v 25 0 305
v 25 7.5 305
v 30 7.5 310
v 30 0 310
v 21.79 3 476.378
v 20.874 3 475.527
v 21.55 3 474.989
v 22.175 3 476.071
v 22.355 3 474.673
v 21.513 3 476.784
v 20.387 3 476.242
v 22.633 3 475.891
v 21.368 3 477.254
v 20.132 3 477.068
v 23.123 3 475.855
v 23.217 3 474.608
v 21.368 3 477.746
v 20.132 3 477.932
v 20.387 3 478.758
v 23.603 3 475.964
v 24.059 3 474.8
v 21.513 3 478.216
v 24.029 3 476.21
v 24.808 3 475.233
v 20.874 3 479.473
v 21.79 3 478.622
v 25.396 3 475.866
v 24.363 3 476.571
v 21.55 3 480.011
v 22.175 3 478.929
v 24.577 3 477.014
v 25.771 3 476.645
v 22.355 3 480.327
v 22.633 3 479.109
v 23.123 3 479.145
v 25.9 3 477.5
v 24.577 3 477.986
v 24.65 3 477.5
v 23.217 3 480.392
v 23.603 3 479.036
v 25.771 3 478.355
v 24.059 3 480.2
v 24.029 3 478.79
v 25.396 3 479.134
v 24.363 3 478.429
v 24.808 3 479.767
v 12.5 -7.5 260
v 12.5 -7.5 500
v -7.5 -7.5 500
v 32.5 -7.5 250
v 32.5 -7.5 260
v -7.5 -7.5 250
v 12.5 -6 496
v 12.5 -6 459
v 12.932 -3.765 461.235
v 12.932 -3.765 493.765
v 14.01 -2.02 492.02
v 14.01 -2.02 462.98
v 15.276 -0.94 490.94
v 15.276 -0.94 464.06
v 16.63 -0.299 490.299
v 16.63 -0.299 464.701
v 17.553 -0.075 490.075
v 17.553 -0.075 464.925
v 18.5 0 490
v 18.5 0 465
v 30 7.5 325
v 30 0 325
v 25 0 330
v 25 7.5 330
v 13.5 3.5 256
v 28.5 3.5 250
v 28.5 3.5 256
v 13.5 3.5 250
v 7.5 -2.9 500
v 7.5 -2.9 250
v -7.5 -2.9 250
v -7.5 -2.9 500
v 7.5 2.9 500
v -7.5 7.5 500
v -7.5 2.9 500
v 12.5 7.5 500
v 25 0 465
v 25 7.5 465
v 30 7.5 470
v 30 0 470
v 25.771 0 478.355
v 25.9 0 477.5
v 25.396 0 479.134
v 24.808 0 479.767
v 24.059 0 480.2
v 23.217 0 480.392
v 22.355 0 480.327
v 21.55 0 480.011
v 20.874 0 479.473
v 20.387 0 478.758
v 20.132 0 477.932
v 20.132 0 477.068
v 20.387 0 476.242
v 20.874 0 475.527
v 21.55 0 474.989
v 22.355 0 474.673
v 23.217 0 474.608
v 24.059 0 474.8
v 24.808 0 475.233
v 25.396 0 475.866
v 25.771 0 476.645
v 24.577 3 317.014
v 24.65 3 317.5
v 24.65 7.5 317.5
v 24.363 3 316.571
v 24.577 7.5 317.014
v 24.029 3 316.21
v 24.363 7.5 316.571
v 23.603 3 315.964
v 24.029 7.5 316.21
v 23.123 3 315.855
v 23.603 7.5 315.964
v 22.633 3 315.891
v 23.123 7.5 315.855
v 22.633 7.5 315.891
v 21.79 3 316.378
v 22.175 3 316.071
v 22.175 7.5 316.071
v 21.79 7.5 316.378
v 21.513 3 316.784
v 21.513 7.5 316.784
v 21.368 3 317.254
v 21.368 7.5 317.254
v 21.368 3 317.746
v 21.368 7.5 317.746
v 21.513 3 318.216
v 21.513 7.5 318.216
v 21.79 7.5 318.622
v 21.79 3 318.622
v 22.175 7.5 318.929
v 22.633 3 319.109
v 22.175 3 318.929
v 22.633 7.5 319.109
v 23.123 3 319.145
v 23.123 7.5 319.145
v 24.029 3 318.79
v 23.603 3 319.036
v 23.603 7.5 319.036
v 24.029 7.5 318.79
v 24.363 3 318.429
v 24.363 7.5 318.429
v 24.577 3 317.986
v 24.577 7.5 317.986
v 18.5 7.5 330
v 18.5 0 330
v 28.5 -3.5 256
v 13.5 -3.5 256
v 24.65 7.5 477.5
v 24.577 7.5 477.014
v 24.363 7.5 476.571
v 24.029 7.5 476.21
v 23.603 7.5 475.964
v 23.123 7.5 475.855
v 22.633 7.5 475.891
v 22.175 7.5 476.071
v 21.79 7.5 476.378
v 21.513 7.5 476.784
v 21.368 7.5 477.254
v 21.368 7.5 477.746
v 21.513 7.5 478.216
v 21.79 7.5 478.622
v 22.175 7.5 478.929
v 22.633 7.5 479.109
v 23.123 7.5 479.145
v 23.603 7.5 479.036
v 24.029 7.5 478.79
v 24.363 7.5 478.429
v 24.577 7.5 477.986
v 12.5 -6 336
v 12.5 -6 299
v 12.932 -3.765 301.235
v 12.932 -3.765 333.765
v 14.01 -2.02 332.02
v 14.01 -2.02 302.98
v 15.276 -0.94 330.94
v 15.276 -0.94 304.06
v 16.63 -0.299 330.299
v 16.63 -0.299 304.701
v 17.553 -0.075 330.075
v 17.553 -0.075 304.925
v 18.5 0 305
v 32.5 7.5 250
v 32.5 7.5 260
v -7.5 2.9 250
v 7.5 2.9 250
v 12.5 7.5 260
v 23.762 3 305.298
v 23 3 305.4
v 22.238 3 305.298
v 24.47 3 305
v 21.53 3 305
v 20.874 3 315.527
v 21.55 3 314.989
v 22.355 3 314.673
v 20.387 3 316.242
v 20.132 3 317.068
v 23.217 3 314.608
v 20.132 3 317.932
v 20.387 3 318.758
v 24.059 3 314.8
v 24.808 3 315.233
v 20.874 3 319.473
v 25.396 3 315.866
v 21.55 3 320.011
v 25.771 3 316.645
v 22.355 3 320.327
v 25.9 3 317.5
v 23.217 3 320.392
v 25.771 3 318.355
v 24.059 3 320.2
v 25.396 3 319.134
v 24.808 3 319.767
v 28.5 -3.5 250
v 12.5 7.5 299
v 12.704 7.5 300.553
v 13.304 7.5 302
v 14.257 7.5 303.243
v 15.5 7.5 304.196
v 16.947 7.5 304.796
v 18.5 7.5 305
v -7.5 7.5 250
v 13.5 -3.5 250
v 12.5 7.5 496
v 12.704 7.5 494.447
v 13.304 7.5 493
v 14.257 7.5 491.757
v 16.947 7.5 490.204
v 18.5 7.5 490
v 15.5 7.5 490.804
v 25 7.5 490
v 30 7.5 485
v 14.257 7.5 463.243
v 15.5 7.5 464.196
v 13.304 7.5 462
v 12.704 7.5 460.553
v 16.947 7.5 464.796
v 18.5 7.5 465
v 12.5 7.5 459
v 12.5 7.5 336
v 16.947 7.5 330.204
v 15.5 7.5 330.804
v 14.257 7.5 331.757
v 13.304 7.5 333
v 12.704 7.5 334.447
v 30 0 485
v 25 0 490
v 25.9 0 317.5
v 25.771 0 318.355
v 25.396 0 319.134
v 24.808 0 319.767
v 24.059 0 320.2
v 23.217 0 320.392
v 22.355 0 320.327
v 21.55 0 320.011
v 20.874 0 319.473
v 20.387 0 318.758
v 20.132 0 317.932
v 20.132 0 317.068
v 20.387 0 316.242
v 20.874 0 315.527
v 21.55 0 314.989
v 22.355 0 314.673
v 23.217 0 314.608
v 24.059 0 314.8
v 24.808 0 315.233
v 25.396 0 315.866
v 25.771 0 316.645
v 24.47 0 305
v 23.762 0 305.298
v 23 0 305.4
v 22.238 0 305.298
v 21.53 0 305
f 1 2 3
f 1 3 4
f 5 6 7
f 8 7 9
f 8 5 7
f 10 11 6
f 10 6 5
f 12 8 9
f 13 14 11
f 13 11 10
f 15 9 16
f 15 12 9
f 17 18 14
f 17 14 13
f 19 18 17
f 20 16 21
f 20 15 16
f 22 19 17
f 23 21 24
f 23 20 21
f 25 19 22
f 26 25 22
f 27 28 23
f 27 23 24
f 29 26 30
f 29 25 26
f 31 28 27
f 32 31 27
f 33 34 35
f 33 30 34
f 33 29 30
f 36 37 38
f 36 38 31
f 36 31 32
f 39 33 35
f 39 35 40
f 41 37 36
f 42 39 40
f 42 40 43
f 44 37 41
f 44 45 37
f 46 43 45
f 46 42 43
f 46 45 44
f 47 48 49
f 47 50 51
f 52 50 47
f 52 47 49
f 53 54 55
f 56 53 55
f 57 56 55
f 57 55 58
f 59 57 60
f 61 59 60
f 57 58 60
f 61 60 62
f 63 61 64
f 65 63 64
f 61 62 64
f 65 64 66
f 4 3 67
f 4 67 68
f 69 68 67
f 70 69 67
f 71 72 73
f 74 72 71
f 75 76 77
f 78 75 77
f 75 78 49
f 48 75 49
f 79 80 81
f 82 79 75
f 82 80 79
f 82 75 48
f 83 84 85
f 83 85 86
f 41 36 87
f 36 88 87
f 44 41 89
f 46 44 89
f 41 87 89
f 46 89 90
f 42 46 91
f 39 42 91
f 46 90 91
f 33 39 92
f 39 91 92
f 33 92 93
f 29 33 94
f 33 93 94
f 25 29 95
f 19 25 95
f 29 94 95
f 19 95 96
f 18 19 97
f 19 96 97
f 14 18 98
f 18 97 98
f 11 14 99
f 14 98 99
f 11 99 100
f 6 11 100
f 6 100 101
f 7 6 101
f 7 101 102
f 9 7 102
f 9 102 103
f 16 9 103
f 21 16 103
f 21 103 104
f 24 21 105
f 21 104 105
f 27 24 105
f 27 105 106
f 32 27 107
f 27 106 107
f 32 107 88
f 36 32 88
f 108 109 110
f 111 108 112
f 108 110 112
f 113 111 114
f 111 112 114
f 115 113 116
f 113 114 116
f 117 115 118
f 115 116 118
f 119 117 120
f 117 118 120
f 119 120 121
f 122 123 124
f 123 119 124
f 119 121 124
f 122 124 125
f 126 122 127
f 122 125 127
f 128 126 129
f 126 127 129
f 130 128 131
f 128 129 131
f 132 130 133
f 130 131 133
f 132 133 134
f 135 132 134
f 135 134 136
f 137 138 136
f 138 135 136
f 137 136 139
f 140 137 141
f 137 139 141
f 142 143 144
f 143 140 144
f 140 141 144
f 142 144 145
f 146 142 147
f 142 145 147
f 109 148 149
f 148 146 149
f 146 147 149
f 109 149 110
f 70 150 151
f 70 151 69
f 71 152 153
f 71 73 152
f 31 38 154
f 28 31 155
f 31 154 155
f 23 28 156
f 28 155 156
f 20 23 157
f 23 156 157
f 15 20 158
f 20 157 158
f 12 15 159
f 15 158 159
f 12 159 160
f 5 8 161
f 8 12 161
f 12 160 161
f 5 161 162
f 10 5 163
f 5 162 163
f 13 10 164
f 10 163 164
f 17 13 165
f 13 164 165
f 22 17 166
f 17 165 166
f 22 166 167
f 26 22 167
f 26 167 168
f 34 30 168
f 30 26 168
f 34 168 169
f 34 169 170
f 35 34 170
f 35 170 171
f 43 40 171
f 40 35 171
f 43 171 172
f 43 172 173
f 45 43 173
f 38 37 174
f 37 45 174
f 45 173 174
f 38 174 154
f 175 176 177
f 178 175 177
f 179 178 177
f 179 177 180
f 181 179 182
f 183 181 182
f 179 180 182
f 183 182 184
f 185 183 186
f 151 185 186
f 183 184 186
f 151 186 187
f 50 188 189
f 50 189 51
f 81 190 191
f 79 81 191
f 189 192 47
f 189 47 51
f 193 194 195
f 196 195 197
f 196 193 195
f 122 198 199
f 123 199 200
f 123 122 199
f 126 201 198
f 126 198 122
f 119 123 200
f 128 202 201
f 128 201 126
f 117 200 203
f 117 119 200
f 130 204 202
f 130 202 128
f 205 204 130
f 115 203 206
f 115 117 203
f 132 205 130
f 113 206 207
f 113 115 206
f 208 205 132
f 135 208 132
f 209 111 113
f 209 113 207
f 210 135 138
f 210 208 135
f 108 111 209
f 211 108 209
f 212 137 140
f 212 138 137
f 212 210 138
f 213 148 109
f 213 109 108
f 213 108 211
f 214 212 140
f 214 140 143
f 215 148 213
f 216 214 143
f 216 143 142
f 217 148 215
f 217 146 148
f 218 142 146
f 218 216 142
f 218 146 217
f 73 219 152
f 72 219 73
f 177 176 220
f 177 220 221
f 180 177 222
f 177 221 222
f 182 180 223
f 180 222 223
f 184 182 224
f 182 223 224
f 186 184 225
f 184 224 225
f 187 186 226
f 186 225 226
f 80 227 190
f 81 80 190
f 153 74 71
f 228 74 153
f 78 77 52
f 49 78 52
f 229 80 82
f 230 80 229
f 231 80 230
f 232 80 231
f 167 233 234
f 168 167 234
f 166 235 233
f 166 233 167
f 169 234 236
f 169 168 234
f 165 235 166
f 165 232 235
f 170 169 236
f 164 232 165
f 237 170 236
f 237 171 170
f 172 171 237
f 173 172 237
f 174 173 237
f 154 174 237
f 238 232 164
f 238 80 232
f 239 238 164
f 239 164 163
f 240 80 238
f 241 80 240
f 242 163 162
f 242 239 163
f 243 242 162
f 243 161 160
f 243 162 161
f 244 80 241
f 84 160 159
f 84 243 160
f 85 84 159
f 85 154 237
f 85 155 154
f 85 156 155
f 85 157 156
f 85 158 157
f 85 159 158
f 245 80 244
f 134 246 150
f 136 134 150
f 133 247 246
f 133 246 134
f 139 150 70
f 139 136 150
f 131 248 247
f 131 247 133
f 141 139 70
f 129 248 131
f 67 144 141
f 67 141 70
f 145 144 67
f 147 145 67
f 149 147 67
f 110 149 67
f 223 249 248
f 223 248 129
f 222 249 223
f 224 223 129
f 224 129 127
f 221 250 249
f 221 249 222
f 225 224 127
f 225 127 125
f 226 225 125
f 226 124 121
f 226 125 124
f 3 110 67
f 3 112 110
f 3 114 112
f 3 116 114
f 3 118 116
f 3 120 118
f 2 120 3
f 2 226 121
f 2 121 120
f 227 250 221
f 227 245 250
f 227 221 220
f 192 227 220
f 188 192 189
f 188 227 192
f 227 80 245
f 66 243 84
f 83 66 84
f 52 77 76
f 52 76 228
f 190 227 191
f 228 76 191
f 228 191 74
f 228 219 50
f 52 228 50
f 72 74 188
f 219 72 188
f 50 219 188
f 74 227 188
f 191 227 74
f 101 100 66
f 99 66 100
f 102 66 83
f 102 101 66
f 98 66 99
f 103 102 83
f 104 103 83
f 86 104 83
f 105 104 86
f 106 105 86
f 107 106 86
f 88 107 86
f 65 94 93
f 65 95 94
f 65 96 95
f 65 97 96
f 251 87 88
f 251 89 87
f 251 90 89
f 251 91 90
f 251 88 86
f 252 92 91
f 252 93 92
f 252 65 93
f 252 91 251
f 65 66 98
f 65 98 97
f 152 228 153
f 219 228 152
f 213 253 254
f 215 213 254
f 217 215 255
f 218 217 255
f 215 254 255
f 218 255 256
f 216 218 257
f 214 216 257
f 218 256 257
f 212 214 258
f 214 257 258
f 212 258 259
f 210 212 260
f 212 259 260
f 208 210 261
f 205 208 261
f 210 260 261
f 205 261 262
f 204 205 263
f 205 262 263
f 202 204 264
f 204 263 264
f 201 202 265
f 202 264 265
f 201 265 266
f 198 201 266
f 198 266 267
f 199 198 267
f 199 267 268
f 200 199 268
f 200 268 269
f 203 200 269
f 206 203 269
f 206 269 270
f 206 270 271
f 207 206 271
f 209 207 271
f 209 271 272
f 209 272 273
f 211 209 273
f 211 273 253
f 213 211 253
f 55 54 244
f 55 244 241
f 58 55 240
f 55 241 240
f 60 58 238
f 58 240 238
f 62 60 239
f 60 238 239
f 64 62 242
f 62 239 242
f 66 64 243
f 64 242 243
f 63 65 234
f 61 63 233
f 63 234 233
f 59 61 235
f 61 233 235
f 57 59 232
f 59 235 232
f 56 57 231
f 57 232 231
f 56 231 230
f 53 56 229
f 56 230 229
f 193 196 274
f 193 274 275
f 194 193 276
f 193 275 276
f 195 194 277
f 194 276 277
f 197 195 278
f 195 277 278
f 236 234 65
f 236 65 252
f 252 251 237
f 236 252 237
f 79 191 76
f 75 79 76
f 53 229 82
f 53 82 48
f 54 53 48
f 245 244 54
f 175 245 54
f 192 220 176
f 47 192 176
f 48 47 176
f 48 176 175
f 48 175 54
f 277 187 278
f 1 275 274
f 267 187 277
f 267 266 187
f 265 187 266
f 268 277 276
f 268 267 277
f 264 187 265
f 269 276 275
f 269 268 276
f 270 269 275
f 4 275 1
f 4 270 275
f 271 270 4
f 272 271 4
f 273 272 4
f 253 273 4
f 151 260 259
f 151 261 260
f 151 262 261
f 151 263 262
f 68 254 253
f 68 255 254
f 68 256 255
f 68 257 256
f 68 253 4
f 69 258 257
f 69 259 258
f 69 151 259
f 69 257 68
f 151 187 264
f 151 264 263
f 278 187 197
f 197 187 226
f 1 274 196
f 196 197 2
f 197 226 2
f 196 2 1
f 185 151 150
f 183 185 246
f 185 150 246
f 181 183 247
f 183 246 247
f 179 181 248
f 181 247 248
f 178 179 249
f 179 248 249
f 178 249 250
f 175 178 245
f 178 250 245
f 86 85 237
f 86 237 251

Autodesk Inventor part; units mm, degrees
ref_plane "YZ Plane" through (0, 0, 0) normal (1, 0, 0) x (0, 1, 0)
ref_plane "XZ Plane" through (0, 0, 0) normal (0, 1, 0) x (-1, 0, 0)
sketch "Sketch1" plane through (0, 0, 0) normal (0, 0, 1) x (1, 0, 0)
  line L0 (-7.5, 2.9) -> (7.5, 2.9)
  line L1 (7.5, 2.9) -> (7.5, -2.9)
  line L2 (7.5, -2.9) -> (-7.5, -2.9)
  line L3 (-7.5, -2.9) -> (-7.5, 2.9)
  line L4 (-7.5, 2.9) -> (7.5, -2.9) construction
  line L5 (7.5, 2.9) -> (-7.5, -2.9) construction
  line L6 (-12.5, 7.5) -> (12.5, 7.5)
  line L7 (12.5, 7.5) -> (12.5, -7.5)
  line L8 (12.5, -7.5) -> (-12.5, -7.5)
  line L9 (-12.5, -7.5) -> (-12.5, 7.5)
  line L10 (-12.5, 7.5) -> (12.5, -7.5) construction
  line L11 (12.5, 7.5) -> (-12.5, -7.5) construction
  line L12 (-7.5, 7.5) -> (-7.5, -7.5)
  point P0 (0, 0)
  point P1 (-7.5, 2.9)
  dimension "d0" = 15
  dimension "d1" = 5.8
  dimension "d2" = 25
  dimension "d3" = 15
extrude "Extrusion1" add sketch "Sketch1" along normal blind 500 contours L12 L6 L7 L8 L2 L1 L0
ref_plane "Work Plane1" through (0, 0, 330) normal (0, 0, 1) x (1, 0, 0)
sketch "Sketch2" plane through (0, 0, 330) normal (0, 0, 1) x (1, 0, 0)
  line L0 (-5, 7.5) -> (30, 7.5)
  line L1 (30, 7.5) -> (30, -7.5)
  line L2 (30, -7.5) -> (-5, -7.5)
  line L3 (-5, -7.5) -> (-5, 7.5)
  line L4 (12.5, -7.5) -> (12.5, 7.5)
  line L5 (-5, 7.5) -> (30, -7.5) construction
  line L6 (30, 7.5) -> (-5, -7.5) construction
  line L7 (12.5, 0) -> (30, 0)
  line L8 (30, 0) -> (30, 7.5)
  line L9 (30, 7.5) -> (12.5, 7.5)
  line L10 (12.5, 7.5) -> (12.5, 0)
  line L11 (7.5, -2.9) -> (-7.5, -2.9) projected
  line L12 (-7.5, -2.9) -> (-7.5, -7.5) projected
  line L13 (-7.5, -7.5) -> (12.5, -7.5) projected
  line L14 (12.5, -7.5) -> (12.5, 7.5) projected
  line L15 (12.5, 7.5) -> (-7.5, 7.5) projected
  line L16 (-7.5, 7.5) -> (-7.5, 2.9) projected
  line L17 (-7.5, 2.9) -> (7.5, 2.9) projected
  line L18 (7.5, 2.9) -> (7.5, -2.9) projected
  point P0 (0, 0)
  point P1 (12.5, -6.5)
  point P2 (12.5, 6.5)
  point P3 (12.5, 7.5)
  point P4 (12.5, 6.5)
  point P5 (30, 0)
  dimension "d8" = 35
extrude "Extrusion2" add sketch "Sketch2" against normal blind 25 contours L0 L1 L7 L4
fillet "Fillet2" radius 6 3 edges at (12.5, 3.75, 305) (12.5, 0, 317.5) (12.5, 3.75, 330)
sketch "Sketch4" plane through (-7.5, 7.5, 0) normal (0, 1, 0) x (1, 0, 0)
  line L0 (20, 0) -> (0, 0) projected
  line L1 (0, 0) -> (0, -500) projected
  line L2 (20, -500) -> (0, -500) projected
  line L3 (20, -336) -> (20, -500) projected
  arc A0 (26, -330) -> (20, -336) centre (26, -336) ccw projected
  line L4 (37.5, -330) -> (26, -330) projected
  line L5 (37.5, -330) -> (37.5, -305) projected
  line L6 (26, -305) -> (37.5, -305) projected
  arc A1 (20, -299) -> (26, -305) centre (26, -299) ccw projected
  line L7 (20, 0) -> (20, -299) projected
  circle A2 centre (30.5, -317.5) radius 1.65
  line L8 (20, 0) -> (20, -500) projected
  line L9 (20, -250) -> (51.65, -250)
  circle A3 centre (30.5, -142.5) radius 1.65
  point P0 (7.5, 0)
  point P1 (20, -181)
  point P2 (20, -144)
  point P3 (37.5, -317.5)
  point P4 (37.5, -142.5)
  dimension "d16" = 3.3
  dimension "d17" = 7
extrude "Extrusion4" cut sketch "Sketch4" against normal through all contours A2 | A3
chamfer "Chamfer1" distance 5 angle 45 2 edges at (30, 3.75, 330) (30, 3.75, 305)
sketch "Sketch5" plane through (18.5, 0, 305) normal (0, -1, 0) x (1, 0, 0)
  line L0 (11.5, -170) -> (6.5, -175) projected
  line L1 (11.5, -170) -> (11.5, -155) projected
  line L2 (6.5, -150) -> (11.5, -155) projected
  line L3 (0, -150) -> (6.5, -150) projected
  line L4 (0, -175) -> (0, -150) projected
  line L5 (6.5, -175) -> (0, -175) projected
  circle A0 centre (4.5, -162.5) radius 1.65 projected
  circle A1 centre (4.5, 12.5) radius 1.65 projected
  line L6 (11.5, 5) -> (6.5, 0) projected
  line L7 (11.5, 20) -> (11.5, 5) projected
  line L8 (6.5, 25) -> (11.5, 20) projected
  line L9 (0, 25) -> (6.5, 25) projected
  line L10 (0, 0) -> (0, 25) projected
  line L11 (6.5, 0) -> (0, 0) projected
  circle A2 centre (4.5, 12.5) radius 2.9
  circle A3 centre (4.5, -162.5) radius 2.9
  point P0 (-18.5, -305)
  dimension "d23" = 5.8
extrude "Extrusion5" cut sketch "Sketch5" against normal blind 3 contours A2 | A3
ref_plane "Work Plane3" through (0, 0, 250) normal (0, 0, -1) x (-1, 0, 0)
pattern_linear "Rectangular Pattern1" count 2 spacing 160 along (0, 0, 1) of "Extrusion2", "Fillet2", "Extrusion4", "Chamfer1", "Extrusion5"
mirror "Mirror1" about plane through (0, 0, 250) normal (0, 0, -1) of "Extrusion2", "Fillet2", "Extrusion4", "Chamfer1", "Extrusion5", "Rectangular Pattern1"
ref_plane "Work Plane4" through (0, 0, 250) normal (0, 0, 1) x (1, 0, 0)
sketch "Sketch6" plane through (0, 0, 250) normal (0, 0, 1) x (1, 0, 0)
  line L0 (12.5, 7.5) -> (12.5, -6) projected
  line L1 (12.5, -6) -> (12.5, 7.5) projected
  line L2 (12.5, 7.5) -> (12.5, -6) projected
  line L3 (12.5, -6) -> (12.5, 7.5) projected
  line L4 (12.5, 7.5) -> (12.5, -6) projected
  line L5 (12.5, -6) -> (12.5, 7.5) projected
  line L6 (12.5, 7.5) -> (12.5, -6) projected
  line L7 (12.5, -7.5) -> (12.5, 7.5) projected
  line L8 (12.5, -7.5) -> (12.5, 7.5) projected
  line L9 (12.5, -6) -> (12.5, 7.5) projected
  line L10 (12.5, 7.5) -> (32.5, 7.5)
  line L11 (32.5, 7.5) -> (32.5, -7.5)
  line L12 (32.5, -7.5) -> (12.5, -7.5)
  line L13 (12.5, -7.5) -> (12.5, 7.5)
  point P0 (0, 0)
  dimension "d29" = 20
extrude "Extrusion6" add sketch "Sketch6" along normal mid plane 20
sketch "Sketch7" plane through (0, 0, 250) normal (0, 0, 1) x (1, 0, 0)
  line L0 (-73.1551, 38.5197) -> (60.6388, 38.5197)
  line L1 (60.6388, 38.5197) -> (60.6388, -29.4562)
  line L2 (60.6388, -29.4562) -> (-73.1551, -29.4562)
  line L3 (-73.1551, -29.4562) -> (-73.1551, 38.5197)
  point P0 (0, 0)
extrude "Extrusion7" cut sketch "Sketch7" against normal through all
sketch "Sketch8" plane through (0, 0, 250) normal (0, 0, -1) x (-1, 0, 0)
  line L0 (-7.5, 2.9) -> (-7.5, -2.9) projected
  line L1 (7.5, 2.9) -> (-7.5, 2.9) projected
  line L2 (7.5, 7.5) -> (7.5, 2.9) projected
  line L3 (-32.5, 7.5) -> (7.5, 7.5) projected
  line L4 (-32.5, -7.5) -> (-32.5, 7.5) projected
  line L5 (7.5, -7.5) -> (-32.5, -7.5) projected
  line L6 (7.5, -2.9) -> (7.5, -7.5) projected
  line L7 (-7.5, -2.9) -> (7.5, -2.9) projected
  line L8 (-28.5, 3.5) -> (-13.5, 3.5)
  line L9 (-13.5, 3.5) -> (-13.5, -3.5)
  line L10 (-13.5, -3.5) -> (-28.5, -3.5)
  line L11 (-28.5, -3.5) -> (-28.5, 3.5)
  point P0 (0, 0)
  point P1 (-28.5, 0)
  point P2 (-32.5, 0)
  dimension "d34" = 4
  dimension "d35" = 15
  dimension "d36" = 7
extrude "Extrusion8" cut sketch "Sketch8" against normal blind 6 contours L8 L9 L10 L11
properties part number "GUIA DE TAPA PRINCIPAL"
